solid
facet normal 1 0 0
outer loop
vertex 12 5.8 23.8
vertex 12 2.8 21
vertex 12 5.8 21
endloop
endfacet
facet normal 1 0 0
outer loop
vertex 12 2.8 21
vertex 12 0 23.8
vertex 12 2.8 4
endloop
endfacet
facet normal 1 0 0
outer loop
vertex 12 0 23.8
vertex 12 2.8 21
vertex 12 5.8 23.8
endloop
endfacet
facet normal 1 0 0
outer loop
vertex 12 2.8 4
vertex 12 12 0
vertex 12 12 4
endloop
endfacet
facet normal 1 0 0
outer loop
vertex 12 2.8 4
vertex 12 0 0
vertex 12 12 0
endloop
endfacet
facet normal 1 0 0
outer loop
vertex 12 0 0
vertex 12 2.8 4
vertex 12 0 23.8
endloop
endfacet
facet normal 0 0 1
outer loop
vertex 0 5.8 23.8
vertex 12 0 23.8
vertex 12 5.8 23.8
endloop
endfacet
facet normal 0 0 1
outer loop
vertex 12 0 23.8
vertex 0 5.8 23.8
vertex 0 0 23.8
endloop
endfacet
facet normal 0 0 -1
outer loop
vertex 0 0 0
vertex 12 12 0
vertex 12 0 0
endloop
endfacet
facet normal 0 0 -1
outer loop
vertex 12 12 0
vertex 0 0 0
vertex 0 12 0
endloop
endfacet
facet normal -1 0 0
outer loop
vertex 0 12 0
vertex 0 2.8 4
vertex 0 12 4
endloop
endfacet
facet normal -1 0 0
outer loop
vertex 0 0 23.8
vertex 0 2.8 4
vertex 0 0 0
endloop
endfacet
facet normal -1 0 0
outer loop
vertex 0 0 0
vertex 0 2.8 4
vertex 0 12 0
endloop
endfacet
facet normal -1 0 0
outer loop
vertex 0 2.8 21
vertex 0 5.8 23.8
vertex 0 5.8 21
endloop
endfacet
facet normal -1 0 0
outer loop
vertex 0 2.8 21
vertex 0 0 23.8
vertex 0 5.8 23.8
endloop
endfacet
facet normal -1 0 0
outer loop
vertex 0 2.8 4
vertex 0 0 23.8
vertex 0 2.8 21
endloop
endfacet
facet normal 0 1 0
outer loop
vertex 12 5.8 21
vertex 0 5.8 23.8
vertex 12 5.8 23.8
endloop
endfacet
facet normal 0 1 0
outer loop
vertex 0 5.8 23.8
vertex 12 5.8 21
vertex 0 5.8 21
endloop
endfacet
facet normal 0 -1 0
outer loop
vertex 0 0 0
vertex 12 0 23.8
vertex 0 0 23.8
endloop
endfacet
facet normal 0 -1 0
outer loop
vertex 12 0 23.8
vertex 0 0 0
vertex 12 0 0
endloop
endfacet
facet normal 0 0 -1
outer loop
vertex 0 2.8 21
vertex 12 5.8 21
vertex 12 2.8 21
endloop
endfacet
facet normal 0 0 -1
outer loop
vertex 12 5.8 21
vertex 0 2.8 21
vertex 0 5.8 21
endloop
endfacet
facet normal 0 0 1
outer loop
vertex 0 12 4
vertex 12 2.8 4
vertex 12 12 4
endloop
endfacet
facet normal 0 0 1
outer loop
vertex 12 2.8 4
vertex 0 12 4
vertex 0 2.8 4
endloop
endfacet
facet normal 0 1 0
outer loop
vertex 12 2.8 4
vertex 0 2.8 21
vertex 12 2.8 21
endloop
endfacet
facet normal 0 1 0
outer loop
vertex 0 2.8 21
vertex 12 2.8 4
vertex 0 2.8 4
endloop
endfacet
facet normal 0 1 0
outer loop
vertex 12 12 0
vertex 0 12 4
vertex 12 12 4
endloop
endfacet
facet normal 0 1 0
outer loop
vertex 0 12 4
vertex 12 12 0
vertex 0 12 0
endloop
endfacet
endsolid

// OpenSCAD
wall=2.8;
$fn=100;


		
		// front
		difference() {
			cube([12,3+wall,17+4+wall]);
			#translate([-1,wall,4]) cube([14,3,17]);
		}
		cube([12,12,4]);
